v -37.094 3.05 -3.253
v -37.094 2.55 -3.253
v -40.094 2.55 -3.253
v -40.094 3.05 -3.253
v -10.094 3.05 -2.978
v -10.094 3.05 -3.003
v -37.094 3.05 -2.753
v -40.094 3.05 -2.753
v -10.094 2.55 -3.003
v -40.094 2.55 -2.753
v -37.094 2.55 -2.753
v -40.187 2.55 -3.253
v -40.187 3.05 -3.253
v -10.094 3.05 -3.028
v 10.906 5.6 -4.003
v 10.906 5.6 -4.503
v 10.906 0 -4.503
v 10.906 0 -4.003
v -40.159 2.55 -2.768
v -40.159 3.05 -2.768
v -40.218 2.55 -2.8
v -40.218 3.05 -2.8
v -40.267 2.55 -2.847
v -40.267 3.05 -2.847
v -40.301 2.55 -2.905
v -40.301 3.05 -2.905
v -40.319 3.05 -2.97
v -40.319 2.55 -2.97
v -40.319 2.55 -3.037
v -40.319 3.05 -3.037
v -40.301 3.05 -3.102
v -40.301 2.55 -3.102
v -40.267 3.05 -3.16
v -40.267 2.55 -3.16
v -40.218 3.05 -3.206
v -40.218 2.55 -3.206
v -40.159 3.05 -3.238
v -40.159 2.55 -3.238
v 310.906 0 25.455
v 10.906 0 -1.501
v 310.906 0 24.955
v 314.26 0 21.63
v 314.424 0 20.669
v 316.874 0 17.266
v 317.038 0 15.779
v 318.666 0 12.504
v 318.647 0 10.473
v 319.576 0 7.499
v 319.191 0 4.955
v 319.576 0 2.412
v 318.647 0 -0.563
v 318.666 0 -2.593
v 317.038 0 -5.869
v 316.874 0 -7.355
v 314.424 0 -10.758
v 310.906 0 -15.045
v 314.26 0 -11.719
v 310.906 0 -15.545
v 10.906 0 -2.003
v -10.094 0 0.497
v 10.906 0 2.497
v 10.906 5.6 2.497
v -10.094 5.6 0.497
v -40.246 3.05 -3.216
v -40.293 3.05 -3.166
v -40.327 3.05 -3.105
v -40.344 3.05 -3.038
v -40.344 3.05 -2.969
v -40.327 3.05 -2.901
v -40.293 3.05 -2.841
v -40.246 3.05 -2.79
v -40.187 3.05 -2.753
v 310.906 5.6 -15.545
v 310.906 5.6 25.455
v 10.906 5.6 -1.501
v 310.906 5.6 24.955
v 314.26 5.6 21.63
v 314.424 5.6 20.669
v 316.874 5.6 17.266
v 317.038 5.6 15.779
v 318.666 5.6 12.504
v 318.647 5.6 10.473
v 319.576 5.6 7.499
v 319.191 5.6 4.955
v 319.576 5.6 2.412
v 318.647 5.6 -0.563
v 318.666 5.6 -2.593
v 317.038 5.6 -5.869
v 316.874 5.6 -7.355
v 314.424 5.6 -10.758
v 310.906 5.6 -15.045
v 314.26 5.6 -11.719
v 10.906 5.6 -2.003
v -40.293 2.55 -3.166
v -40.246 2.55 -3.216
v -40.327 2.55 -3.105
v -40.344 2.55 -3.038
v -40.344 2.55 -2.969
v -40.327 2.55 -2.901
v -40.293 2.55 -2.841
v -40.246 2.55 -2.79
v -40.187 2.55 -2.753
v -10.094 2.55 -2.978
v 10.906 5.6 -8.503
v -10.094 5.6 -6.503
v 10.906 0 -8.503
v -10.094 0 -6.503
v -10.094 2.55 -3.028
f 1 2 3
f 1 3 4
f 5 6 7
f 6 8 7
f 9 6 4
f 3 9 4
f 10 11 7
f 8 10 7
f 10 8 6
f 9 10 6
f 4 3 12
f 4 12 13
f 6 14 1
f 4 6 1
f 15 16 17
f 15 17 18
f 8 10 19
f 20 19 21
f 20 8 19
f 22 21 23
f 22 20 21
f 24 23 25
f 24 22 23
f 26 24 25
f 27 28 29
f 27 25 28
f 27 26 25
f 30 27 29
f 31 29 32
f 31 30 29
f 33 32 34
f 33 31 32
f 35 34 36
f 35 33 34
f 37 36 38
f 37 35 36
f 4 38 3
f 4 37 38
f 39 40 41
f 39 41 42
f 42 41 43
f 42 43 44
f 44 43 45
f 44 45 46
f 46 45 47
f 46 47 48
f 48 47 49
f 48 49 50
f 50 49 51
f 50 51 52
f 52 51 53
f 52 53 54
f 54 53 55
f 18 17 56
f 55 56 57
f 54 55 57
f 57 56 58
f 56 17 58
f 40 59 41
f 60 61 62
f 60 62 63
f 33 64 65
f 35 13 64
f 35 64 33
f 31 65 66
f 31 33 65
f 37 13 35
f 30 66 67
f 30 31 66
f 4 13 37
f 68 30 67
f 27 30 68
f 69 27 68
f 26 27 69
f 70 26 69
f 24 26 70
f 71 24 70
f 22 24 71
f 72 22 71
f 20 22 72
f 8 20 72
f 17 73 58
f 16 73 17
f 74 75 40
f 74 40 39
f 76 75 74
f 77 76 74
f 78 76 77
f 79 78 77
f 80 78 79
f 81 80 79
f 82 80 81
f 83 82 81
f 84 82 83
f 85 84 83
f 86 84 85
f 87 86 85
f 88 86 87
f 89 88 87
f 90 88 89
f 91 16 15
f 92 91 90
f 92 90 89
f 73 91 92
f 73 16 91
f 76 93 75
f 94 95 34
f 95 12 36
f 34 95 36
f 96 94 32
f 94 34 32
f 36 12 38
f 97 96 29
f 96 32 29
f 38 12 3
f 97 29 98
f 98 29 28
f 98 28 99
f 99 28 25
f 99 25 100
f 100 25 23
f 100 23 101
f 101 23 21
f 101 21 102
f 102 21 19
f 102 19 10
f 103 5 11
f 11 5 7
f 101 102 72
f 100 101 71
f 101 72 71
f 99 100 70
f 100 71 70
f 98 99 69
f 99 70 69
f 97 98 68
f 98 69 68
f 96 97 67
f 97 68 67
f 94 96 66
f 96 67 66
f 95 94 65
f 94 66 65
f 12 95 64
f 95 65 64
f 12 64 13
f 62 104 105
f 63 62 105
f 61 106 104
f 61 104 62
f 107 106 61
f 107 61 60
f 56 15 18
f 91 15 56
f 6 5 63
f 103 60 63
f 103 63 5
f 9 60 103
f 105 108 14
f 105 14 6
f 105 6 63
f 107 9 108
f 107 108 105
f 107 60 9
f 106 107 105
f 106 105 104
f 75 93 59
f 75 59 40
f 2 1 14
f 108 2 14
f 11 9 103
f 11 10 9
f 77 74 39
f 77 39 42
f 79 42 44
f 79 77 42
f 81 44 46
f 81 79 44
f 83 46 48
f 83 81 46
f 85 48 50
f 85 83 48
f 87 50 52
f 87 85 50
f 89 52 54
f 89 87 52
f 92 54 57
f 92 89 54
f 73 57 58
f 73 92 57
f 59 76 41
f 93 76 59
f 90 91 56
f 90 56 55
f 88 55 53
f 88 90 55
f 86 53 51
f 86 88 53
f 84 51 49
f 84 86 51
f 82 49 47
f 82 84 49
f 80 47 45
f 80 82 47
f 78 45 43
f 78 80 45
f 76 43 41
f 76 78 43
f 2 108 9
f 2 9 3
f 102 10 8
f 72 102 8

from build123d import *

# Parameters (mm, degrees)
BOSS_EXTRUDE1_DEPTH = 5.6
SKETCH2_W           = 0.5
SKETCH2_H           = 0.5
BOSS_EXTRUDE2_DEPTH = 100
CUT_EXTRUDE1_DEPTH  = 100
SKETCH4_W           = 2
SKETCH4_H           = 5.6
BOSS_EXTRUDE3_DEPTH = 300
SKETCH5_W           = 300
SKETCH5_H           = 2
CUT_EXTRUDE4_DEPTH  = 65
BOSS_EXTRUDE4_DEPTH = 5.6


with BuildPart() as part:
    # Sketch1 → Boss-Extrude1 (new body)
    with BuildSketch(Plane(origin=(0, 0, 0), x_dir=(1, 0, 0), z_dir=(0, 1, 0))):
        Polygon((-10.093548387, 6.503225806), (10.906451613, 8.503225806), (10.906451613, -2.496774194), (-10.093548387, -0.496774194), align=None)
    extrude(amount=BOSS_EXTRUDE1_DEPTH)

    # Sketch2 → Boss-Extrude2 (add)
    with BuildSketch(Plane.ZY.offset(10.093548387)):
        with Locations((-3.003225806, 2.8)):
            Rectangle(SKETCH2_W, SKETCH2_H)
    extrude(amount=BOSS_EXTRUDE2_DEPTH)

    # Sketch3 → Cut-Extrude1 (cut)
    with BuildSketch(Plane(origin=(0, 3.05, 0), x_dir=(1, 0, 0), z_dir=(0, 1, 0))):
        Polygon((-10.093548387, 3.028225806), (-10.093548387, 3.253225806), (-37.093548387, 3.253225806), align=None)
        with BuildLine():
            Line((-10.093548387, 3.003225806), (-40.093548387, 3.253225806))
            ThreePointArc((-40.093548387, 3.253225806), (-40.321412932, 3.003225806), (-40.093548387, 2.753225806))
            Line((-40.093548387, 2.753225806), (-10.093548387, 3.003225806))
        make_face()
        with BuildLine():
            ThreePointArc((-40.187314985, 2.753225806), (-40.346412932, 3.003225806), (-40.187314985, 3.253225806))
            Line((-40.187314985, 3.253225806), (-110.093548387, 3.253225806))
            Line((-110.093548387, 3.253225806), (-110.093548387, 2.753225806))
            Line((-110.093548387, 2.753225806), (-40.187314985, 2.753225806))
        make_face()
        Polygon((-10.093548387, 2.753225806), (-10.093548387, 2.978225806), (-37.093548387, 2.753225806), align=None)
    extrude(amount=-CUT_EXTRUDE1_DEPTH, mode=Mode.SUBTRACT)


with BuildPart() as cut_extrude1_piece_1:
    # of the separate pieces the step leaves, piece 1, a body of its own (cut_extrude1_pieces)
    add(part.part.solids().sort_by_distance((-10.093548387, 0, -6.503225806))[0])

    # Sketch4 → Boss-Extrude3 (add)
    with BuildSketch(Plane(origin=(10.906451613, 0, 0), x_dir=(0, 0, -1), z_dir=(1, 0, 0))):
        with Locations((3.003225806, 2.8)):
            Rectangle(SKETCH4_W, SKETCH4_H)
    extrude(amount=BOSS_EXTRUDE3_DEPTH)

    # Sketch5 → Cut-Extrude4 (cut)
    with BuildSketch(Plane(origin=(0, 5.6, 0), x_dir=(1, 0, 0), z_dir=(0, 1, 0))):
        with Locations((160.906451613, 3.003225806)):
            Rectangle(SKETCH5_W, SKETCH5_H)
    extrude(amount=-CUT_EXTRUDE4_DEPTH, mode=Mode.SUBTRACT)


with BuildPart() as cut_extrude1_piece_2:
    # of the separate pieces the step leaves, piece 2, a body of its own (cut_extrude1_pieces)
    add(part.part.solids().sort_by_distance((-40.187314985, 2.55, -2.753225806))[0])


with BuildPart() as body_3:
    # Sketch5<8> → Boss-Extrude4 (new body)
    with BuildSketch(Plane(origin=(0, 5.6, 0), x_dir=(1, 0, 0), z_dir=(0, 1, 0))):
        with BuildLine():
            Line((10.906451613, 4.503225806), (10.906451613, 4.003225806))
            Line((10.906451613, 4.003225806), (310.906451613, 15.044597432))
            ThreePointArc((310.906451613, 15.044597432), (319.19072286, -4.955402568), (310.906451613, -24.955402568))
            Line((310.906451613, -24.955402568), (10.906451613, 2.003225806))
            Line((10.906451613, 2.003225806), (10.906451613, 1.501089766))
            Line((10.906451613, 1.501089766), (310.906451613, -25.455402568))
            ThreePointArc((310.906451613, -25.455402568), (319.69072286, -4.955402568), (310.906451613, 15.544597432))
            Line((310.906451613, 15.544597432), (10.906451613, 4.503225806))
        make_face()
    extrude(amount=-BOSS_EXTRUDE4_DEPTH)


solid = Compound([cut_extrude1_piece_1.part, cut_extrude1_piece_2.part, body_3.part])
